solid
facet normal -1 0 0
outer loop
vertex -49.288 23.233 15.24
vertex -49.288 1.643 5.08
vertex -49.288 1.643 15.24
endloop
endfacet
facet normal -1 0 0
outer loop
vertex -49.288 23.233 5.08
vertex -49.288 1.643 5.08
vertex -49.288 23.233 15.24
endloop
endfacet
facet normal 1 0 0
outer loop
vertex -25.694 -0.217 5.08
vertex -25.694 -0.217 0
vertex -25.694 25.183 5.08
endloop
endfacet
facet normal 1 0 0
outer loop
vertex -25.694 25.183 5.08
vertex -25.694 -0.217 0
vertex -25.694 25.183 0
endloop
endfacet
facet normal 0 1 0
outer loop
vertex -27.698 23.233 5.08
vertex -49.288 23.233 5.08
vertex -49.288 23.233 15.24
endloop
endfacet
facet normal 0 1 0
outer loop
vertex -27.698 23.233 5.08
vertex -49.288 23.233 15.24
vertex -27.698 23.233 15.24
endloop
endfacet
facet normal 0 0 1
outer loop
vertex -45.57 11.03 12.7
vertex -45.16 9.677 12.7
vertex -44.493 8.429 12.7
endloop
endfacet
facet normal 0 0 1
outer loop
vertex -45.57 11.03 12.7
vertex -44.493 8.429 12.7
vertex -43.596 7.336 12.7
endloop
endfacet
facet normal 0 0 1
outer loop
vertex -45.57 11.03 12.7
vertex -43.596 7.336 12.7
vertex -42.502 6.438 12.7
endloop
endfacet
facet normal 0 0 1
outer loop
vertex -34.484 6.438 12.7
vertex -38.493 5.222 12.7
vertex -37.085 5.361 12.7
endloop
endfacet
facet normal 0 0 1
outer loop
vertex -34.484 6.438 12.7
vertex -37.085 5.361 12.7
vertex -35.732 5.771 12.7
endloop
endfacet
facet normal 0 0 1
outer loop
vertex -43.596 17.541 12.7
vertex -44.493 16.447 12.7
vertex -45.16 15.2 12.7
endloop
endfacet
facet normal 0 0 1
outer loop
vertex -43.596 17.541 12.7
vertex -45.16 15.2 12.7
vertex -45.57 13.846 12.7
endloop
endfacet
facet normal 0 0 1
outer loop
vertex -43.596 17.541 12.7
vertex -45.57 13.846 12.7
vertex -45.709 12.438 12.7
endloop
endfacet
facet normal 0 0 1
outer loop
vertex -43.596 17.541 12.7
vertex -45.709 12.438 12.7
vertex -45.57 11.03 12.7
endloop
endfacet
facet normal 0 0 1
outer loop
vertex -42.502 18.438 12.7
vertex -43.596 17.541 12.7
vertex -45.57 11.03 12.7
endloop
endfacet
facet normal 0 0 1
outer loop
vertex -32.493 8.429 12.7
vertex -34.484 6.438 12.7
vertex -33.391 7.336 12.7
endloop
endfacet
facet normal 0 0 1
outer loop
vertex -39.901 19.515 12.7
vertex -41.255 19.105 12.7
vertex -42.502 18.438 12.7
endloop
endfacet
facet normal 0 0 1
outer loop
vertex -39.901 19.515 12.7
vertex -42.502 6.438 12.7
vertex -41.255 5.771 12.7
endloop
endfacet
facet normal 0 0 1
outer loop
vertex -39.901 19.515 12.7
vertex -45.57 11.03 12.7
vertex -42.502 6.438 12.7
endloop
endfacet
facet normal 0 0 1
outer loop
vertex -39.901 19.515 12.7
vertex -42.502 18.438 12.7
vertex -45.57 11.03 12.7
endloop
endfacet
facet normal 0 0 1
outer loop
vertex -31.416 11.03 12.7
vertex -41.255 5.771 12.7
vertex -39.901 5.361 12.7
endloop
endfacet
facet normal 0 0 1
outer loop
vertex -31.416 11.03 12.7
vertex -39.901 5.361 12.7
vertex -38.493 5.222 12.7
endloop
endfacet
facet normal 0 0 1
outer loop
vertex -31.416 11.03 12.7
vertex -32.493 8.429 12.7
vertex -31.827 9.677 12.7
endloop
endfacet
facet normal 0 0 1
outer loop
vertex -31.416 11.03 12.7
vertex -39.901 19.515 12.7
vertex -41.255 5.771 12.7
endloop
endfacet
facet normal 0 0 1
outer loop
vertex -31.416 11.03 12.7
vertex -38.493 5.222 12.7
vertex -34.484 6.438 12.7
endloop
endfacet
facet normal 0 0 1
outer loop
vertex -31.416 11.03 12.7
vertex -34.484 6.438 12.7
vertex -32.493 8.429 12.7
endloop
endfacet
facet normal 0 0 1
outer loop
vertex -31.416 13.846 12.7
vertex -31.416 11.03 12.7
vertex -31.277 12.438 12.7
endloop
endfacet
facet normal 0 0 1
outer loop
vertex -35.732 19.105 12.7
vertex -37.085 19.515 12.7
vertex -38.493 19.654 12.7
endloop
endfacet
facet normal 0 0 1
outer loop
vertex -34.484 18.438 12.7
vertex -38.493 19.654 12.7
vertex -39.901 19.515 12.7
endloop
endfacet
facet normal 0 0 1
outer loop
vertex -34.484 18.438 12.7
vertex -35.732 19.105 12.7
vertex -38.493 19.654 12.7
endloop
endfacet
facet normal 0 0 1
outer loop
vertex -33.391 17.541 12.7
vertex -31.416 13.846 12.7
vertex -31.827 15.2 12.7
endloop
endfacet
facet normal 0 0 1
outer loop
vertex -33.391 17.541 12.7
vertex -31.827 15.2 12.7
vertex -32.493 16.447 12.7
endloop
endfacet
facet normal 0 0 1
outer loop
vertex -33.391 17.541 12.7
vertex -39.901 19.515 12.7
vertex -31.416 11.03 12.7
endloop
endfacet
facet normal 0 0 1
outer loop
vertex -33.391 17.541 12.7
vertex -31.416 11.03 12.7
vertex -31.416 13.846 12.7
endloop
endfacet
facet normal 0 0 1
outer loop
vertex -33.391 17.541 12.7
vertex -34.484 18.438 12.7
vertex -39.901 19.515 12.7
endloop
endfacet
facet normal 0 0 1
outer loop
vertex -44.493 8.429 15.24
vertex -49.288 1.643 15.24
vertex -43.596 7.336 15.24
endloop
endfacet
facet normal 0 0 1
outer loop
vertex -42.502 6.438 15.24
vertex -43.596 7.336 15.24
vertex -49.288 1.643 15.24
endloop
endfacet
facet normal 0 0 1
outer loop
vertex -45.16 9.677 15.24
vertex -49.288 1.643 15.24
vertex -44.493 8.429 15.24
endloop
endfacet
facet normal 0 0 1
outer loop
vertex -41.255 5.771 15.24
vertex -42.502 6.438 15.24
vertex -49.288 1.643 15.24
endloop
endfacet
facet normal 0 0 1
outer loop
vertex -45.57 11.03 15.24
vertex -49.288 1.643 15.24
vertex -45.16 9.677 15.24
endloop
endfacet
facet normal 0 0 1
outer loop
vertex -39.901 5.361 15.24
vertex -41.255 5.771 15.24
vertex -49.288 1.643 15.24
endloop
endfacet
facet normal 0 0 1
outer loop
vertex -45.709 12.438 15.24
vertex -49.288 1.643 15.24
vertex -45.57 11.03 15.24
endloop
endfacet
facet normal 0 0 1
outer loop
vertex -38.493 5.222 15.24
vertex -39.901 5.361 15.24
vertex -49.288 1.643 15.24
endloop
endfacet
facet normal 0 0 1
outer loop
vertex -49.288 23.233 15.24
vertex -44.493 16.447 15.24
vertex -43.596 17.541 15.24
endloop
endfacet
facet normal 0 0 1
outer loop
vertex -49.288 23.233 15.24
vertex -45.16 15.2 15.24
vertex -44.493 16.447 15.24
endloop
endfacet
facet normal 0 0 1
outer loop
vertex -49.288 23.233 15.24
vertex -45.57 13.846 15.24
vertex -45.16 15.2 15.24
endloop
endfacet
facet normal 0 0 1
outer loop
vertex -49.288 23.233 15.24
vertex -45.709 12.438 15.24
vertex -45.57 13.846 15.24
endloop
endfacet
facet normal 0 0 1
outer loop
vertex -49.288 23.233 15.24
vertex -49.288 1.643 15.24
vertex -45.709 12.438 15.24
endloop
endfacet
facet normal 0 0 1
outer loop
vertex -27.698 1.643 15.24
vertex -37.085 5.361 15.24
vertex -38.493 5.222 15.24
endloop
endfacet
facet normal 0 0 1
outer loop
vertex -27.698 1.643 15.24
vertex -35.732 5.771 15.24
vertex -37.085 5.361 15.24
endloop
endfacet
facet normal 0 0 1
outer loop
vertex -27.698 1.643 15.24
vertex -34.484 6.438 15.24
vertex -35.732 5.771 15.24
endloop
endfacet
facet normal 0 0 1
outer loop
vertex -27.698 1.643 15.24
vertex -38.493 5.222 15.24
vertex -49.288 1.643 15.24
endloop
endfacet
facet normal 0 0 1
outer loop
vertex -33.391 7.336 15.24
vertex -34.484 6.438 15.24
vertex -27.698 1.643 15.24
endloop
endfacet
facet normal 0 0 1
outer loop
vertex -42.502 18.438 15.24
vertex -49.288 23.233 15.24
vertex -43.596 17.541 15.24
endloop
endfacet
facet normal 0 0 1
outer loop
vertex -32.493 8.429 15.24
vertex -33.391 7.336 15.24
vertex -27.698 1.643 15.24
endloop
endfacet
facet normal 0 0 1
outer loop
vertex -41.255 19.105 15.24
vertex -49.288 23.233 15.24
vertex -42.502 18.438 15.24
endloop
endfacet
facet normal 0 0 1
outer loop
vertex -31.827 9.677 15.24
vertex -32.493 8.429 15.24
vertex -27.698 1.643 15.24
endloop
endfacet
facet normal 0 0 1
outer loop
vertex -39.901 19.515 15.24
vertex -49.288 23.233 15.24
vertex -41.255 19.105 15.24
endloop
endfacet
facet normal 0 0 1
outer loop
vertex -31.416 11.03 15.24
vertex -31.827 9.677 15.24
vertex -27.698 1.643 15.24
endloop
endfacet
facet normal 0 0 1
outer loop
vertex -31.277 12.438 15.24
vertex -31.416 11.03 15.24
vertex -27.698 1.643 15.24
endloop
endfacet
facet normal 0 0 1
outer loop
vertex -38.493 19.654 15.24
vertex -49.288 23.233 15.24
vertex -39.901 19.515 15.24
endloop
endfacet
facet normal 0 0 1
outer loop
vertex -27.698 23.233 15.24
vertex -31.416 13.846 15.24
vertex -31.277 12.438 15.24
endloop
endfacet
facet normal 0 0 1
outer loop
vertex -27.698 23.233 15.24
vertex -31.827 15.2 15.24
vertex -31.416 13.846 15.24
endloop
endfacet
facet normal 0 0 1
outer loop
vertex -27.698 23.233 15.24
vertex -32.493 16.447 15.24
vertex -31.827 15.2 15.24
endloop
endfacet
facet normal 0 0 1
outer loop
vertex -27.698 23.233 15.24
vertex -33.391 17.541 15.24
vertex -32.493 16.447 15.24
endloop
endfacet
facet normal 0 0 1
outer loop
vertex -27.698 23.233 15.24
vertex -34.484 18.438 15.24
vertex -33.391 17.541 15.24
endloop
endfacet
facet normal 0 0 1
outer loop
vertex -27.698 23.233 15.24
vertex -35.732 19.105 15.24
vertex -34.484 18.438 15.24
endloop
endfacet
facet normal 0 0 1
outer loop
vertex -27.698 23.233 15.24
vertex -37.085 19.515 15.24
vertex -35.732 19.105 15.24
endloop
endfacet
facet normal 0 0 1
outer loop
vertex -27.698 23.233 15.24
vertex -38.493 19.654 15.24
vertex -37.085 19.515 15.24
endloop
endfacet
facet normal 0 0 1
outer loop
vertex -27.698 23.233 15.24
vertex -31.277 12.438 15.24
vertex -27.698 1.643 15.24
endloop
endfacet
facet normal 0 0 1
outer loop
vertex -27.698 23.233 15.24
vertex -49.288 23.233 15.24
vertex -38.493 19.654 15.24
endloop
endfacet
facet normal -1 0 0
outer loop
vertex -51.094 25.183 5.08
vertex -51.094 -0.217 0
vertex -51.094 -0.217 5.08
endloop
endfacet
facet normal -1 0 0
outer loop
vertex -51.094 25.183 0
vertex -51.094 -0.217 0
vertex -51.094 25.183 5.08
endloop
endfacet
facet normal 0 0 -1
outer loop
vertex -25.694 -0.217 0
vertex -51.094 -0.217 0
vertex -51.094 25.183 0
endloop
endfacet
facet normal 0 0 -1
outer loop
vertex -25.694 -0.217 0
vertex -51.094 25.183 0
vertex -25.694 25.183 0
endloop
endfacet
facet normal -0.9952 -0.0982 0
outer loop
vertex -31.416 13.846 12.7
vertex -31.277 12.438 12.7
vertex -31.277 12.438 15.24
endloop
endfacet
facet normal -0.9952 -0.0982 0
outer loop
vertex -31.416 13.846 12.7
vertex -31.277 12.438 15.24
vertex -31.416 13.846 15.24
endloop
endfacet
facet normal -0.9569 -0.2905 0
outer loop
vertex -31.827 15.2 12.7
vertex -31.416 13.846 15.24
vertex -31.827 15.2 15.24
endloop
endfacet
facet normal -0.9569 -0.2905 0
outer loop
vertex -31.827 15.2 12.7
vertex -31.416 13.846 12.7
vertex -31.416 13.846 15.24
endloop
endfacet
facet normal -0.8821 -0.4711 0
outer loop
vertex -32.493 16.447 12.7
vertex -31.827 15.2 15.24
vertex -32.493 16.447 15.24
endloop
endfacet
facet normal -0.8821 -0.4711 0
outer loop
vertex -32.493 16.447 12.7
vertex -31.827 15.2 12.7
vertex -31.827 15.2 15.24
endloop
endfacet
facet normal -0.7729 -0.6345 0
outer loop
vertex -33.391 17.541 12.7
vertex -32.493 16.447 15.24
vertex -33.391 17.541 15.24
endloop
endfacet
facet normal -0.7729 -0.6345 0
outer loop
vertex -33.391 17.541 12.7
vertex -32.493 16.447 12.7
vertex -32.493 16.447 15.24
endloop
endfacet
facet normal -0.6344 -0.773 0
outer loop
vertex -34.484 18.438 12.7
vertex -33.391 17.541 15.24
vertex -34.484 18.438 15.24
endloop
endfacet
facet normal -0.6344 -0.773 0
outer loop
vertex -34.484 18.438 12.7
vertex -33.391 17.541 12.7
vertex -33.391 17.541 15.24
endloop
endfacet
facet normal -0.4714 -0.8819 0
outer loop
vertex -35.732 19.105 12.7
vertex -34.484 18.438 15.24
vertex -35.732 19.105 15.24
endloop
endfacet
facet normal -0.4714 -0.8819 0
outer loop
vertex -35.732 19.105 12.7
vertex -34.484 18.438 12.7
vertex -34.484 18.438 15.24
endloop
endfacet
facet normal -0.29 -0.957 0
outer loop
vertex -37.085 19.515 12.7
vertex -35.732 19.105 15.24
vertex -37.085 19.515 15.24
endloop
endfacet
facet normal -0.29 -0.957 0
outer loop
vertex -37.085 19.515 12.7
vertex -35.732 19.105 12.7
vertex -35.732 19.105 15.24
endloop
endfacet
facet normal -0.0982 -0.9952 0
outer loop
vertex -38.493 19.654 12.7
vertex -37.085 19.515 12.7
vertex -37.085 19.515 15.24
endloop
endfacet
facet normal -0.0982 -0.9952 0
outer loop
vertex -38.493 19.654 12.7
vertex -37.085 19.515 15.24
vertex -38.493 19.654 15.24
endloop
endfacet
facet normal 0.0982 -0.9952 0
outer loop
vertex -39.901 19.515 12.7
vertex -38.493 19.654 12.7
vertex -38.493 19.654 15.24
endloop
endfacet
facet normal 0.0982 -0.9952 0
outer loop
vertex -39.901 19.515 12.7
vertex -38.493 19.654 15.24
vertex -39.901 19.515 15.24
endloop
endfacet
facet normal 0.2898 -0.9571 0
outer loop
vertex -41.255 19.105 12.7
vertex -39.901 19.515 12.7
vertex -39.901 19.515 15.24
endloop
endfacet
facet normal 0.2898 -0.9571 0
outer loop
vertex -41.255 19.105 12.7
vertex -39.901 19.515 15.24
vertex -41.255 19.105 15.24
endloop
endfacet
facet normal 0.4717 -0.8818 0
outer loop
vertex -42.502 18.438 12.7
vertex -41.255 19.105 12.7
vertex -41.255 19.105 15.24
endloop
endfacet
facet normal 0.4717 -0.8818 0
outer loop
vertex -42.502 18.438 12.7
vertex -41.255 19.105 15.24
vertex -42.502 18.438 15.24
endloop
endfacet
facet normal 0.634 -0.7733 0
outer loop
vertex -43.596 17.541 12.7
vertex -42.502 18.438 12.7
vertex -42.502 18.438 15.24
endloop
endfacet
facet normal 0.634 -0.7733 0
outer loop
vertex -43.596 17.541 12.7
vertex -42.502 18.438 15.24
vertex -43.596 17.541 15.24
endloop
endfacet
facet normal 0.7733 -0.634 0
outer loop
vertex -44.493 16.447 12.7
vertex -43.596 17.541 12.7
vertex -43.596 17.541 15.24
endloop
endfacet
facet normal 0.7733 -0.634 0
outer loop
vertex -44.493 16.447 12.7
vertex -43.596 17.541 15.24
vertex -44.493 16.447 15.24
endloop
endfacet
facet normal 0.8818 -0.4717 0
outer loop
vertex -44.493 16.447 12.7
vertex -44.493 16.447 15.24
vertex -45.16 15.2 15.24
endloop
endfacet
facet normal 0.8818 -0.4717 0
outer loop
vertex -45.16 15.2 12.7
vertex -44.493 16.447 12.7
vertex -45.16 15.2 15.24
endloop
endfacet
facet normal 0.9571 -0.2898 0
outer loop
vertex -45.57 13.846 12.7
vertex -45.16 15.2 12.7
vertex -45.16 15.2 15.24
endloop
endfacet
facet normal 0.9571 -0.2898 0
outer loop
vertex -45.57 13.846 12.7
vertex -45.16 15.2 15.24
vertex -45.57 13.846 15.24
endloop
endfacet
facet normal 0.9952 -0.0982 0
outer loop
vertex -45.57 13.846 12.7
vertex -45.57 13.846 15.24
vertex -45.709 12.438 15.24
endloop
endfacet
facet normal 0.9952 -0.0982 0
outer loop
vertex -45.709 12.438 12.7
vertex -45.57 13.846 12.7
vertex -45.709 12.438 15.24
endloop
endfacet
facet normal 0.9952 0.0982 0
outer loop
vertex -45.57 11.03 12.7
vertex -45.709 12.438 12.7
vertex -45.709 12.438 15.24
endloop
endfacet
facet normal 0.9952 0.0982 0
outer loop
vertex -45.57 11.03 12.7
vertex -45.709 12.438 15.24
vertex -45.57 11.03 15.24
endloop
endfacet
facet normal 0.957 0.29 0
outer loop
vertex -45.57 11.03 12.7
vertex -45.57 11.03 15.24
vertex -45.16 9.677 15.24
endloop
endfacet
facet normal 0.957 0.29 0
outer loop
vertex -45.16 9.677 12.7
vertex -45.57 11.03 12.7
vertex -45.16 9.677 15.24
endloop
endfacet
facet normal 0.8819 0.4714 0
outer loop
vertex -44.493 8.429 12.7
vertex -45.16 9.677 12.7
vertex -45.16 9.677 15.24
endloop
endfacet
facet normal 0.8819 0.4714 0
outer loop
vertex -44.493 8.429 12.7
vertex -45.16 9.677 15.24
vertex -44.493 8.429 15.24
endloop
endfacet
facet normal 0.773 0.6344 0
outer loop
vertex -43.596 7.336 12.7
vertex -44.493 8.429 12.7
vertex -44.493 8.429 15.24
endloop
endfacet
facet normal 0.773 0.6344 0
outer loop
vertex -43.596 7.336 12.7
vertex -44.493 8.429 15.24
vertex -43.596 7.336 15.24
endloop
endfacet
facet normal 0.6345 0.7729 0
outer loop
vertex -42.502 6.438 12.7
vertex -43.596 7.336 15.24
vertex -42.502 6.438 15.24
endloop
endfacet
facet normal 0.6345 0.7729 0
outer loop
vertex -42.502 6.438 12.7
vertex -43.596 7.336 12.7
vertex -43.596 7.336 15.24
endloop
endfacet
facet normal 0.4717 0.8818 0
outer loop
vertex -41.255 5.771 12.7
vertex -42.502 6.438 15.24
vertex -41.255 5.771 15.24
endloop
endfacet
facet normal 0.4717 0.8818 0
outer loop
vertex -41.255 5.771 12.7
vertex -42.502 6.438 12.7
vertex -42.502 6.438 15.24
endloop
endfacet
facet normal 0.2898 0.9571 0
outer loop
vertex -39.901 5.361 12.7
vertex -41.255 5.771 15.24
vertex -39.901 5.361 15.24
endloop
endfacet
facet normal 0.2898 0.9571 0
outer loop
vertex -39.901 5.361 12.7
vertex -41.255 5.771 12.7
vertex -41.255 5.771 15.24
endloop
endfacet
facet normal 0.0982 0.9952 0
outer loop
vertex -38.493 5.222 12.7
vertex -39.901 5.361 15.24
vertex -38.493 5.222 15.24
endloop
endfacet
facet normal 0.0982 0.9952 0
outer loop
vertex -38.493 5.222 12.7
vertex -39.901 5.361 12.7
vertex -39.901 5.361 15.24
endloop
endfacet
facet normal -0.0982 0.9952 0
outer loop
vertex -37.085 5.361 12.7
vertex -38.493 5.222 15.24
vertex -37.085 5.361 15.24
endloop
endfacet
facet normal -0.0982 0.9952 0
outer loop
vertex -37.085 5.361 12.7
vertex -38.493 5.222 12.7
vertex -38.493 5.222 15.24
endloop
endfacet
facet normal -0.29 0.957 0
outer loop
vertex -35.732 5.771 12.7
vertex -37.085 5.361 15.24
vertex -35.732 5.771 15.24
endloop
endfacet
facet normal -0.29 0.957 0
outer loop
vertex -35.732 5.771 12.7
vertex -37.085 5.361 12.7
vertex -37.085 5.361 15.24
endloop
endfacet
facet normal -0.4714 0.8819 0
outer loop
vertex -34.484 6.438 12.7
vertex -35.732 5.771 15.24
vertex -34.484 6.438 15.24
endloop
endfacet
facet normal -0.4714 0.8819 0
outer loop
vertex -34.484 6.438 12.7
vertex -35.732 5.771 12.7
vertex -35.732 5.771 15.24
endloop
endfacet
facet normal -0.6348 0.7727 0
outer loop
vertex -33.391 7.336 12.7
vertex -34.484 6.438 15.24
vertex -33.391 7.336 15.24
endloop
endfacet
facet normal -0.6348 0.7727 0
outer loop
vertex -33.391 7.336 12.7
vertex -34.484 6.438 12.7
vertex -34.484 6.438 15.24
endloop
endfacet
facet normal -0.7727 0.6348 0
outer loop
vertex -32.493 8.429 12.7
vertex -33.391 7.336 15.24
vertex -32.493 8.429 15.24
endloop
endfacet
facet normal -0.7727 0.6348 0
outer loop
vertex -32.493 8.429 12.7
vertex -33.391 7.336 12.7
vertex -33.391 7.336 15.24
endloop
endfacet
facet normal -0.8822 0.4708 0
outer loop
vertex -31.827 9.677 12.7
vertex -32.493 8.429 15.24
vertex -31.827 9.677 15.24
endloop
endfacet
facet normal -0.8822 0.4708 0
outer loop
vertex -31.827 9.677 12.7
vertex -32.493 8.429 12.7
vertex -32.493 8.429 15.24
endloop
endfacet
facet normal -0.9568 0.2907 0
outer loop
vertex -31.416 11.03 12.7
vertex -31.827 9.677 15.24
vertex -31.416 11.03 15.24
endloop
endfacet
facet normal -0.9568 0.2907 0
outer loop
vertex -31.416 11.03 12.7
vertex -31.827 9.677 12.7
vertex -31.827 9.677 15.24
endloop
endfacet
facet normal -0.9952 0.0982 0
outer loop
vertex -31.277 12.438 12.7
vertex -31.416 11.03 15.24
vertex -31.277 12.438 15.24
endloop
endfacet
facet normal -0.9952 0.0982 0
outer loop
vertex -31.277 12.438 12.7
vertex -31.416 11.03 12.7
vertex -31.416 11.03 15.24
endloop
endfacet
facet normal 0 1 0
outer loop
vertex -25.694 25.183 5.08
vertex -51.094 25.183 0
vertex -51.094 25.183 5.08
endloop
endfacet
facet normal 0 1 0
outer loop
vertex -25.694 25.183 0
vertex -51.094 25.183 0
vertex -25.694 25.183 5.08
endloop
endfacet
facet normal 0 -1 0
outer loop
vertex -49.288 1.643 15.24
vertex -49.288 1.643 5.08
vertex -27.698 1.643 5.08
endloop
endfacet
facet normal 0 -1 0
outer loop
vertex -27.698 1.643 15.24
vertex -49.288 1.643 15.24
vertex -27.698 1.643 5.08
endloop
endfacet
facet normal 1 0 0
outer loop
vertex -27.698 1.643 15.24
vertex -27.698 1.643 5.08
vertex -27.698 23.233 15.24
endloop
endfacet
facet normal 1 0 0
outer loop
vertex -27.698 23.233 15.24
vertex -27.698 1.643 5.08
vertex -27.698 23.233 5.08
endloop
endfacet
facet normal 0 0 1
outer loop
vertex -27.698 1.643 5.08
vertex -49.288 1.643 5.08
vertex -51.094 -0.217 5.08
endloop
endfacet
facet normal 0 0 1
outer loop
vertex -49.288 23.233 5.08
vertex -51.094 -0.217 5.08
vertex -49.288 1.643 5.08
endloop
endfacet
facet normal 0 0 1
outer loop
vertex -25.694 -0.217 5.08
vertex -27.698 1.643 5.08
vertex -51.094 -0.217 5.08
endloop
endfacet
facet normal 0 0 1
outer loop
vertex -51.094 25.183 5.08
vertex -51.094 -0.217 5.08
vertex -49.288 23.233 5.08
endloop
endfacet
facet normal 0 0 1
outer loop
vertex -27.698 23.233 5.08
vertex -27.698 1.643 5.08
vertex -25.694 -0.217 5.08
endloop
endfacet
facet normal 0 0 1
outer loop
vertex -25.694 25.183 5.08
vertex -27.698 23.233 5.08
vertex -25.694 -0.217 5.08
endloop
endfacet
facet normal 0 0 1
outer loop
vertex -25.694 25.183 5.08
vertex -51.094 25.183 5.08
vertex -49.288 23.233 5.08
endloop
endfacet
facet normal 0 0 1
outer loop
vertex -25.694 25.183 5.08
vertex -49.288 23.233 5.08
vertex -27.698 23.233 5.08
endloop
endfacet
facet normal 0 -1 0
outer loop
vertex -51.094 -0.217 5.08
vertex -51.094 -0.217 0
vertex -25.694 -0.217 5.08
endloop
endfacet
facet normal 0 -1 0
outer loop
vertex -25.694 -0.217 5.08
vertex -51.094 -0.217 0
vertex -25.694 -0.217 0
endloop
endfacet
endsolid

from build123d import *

# Parameters (mm, degrees)
F0_W     = 25.4
F0_H     = 25.4
F0_W_2   = 21.59
F0_H_2   = 21.59
F1_DEPTH = 5.08
F0_R     = 7.215884
F2_DEPTH = 15.24
F3_DEPTH = 12.7


with BuildPart() as f1:
    # F0 (on Top) → F1 (new body)
    with BuildSketch(Plane.XY):
        with Locations((-38.394353, 12.483482)):
            Rectangle(F0_W, F0_H)
        with Locations((-38.49318, 12.438105)):
            Rectangle(F0_W_2, F0_H_2, mode=Mode.SUBTRACT)
    extrude(amount=F1_DEPTH)

    # F0 (on Top) → F2 (join)
    with BuildSketch(Plane.XY):
        with Locations((-38.49318, 12.438105)):
            Rectangle(F0_W_2, F0_H_2)
        with Locations((-38.49318, 12.438105)):
            Circle(F0_R, mode=Mode.SUBTRACT)
    extrude(amount=F2_DEPTH)

    # F0 (on Top) → F3 (join)
    with BuildSketch(Plane.XY):
        with Locations((-38.49318, 12.438105)):
            Circle(F0_R)
    extrude(amount=F3_DEPTH)


solid = f1.part
